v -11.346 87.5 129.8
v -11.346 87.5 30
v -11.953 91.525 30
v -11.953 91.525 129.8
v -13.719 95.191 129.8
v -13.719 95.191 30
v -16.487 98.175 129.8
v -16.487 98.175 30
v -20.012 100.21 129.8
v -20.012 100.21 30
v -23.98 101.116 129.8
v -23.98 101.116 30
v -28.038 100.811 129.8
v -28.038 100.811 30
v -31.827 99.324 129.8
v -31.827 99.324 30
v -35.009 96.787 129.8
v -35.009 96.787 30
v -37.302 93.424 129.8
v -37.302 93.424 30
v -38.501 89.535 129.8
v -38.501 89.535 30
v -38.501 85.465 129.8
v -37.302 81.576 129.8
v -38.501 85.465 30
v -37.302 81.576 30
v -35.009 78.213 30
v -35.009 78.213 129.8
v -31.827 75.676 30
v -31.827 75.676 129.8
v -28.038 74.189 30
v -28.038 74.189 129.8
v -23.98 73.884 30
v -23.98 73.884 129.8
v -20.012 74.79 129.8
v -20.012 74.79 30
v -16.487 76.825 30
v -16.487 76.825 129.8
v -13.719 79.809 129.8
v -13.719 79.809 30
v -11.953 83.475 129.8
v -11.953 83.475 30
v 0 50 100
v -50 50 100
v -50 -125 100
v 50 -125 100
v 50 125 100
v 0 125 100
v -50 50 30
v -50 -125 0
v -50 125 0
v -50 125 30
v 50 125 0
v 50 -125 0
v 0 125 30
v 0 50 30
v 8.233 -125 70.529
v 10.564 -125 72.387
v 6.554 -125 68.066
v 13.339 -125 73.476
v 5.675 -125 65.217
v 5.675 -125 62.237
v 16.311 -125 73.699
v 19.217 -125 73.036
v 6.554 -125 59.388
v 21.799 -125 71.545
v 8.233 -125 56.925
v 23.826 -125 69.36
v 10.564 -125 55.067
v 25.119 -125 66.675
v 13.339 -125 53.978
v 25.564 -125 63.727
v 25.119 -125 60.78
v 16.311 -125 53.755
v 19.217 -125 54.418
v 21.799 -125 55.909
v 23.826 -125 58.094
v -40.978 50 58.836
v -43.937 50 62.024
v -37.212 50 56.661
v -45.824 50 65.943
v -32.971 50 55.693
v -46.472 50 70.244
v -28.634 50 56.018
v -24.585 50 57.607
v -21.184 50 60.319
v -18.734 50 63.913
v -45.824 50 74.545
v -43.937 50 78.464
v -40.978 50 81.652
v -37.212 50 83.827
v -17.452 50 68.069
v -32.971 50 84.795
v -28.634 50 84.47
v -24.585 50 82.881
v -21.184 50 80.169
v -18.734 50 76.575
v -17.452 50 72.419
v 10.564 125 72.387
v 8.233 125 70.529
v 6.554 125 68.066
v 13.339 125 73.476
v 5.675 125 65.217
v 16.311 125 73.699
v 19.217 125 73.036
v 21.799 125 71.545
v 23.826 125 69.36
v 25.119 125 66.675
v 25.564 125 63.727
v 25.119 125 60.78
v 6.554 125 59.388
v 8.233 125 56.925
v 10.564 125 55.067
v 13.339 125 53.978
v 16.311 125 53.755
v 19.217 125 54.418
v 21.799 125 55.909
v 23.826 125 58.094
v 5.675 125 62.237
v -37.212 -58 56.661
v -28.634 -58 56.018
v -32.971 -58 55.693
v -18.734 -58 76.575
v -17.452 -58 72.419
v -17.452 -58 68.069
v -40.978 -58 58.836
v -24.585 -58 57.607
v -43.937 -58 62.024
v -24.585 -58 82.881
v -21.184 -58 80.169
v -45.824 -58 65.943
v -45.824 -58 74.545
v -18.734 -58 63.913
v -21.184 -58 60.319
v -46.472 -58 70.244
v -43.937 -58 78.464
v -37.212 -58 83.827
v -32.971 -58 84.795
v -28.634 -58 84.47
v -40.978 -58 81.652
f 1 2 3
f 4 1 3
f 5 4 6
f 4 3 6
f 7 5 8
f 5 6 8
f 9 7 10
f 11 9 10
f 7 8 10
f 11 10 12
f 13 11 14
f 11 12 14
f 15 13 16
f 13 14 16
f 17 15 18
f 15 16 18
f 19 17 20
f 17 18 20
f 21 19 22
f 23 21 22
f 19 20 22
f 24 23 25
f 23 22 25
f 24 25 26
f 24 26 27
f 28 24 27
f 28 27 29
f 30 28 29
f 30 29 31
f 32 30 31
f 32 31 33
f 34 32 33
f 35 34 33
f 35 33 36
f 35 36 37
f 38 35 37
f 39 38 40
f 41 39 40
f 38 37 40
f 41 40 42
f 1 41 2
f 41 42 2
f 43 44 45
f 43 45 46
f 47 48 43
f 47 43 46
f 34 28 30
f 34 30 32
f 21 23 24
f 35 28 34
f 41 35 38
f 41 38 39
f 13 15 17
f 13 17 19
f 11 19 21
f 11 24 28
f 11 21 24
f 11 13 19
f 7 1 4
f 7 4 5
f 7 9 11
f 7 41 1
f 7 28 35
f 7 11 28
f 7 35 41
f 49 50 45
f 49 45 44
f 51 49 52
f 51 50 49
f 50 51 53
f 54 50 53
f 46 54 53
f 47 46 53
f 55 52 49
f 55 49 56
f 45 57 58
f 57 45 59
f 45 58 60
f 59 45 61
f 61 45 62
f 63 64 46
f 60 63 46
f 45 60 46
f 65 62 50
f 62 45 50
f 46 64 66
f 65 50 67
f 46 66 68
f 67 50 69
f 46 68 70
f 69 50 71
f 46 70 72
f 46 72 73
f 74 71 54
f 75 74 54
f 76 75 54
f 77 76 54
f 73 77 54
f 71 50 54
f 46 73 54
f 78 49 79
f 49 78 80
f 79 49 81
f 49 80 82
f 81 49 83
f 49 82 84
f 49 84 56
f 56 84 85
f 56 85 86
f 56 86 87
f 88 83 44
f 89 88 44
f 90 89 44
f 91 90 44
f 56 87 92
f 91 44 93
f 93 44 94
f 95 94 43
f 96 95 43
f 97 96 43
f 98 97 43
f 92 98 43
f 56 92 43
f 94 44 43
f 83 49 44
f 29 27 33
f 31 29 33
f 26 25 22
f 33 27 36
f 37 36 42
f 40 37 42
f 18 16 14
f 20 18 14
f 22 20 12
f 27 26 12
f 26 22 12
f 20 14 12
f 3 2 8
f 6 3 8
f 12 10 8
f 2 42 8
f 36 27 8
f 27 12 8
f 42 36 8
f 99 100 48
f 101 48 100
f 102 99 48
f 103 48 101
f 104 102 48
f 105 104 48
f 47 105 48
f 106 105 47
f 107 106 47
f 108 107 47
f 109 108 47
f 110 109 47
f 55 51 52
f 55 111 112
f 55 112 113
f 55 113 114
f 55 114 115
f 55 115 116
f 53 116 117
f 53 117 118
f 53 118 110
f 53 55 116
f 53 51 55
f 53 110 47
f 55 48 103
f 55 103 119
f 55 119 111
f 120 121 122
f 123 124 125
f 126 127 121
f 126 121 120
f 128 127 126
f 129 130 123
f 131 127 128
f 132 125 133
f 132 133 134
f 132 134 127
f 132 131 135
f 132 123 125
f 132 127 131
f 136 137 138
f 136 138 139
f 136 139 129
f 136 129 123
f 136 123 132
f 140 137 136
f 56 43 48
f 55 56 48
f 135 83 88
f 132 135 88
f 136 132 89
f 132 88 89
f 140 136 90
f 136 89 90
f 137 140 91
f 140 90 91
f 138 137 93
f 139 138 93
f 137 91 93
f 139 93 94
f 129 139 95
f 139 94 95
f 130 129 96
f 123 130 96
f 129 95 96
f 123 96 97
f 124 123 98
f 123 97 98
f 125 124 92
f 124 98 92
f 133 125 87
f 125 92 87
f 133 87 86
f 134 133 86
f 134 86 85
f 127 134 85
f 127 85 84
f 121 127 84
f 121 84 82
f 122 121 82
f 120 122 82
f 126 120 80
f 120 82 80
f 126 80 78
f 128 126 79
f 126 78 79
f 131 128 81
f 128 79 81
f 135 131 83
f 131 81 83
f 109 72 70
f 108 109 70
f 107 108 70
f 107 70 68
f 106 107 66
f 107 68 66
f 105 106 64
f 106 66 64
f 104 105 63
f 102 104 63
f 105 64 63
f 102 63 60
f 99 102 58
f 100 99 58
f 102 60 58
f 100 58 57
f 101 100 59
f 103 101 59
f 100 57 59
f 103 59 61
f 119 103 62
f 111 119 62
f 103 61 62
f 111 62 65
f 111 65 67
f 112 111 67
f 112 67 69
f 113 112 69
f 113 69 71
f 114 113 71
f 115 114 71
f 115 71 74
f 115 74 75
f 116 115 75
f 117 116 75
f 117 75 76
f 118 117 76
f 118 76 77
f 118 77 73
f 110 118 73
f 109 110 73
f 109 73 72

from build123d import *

# Parameters (mm, degrees)
F0_W     = 100
F0_H     = 250
F1_DEPTH = 100
F2_W     = 100
F2_H     = 150
F3_DEPTH = 70
F4_R     = 14.59155
F5_DEPTH = 108
F7_D     = 20
F8_R     = 13.653747
F9_DEPTH = 99.8


with BuildPart() as f1:
    # F0 (on Top) → F1 (new body)
    with BuildSketch(Plane.XY):
        Rectangle(F0_W, F0_H)
    extrude(amount=F1_DEPTH)

    # F2 (on face) → F3 (cut)
    with BuildSketch(Plane.XY.offset(100)):
        with Locations((-50, 125)):
            Rectangle(F2_W, F2_H)
    extrude(amount=-F3_DEPTH, mode=Mode.SUBTRACT)

    # F4 (on face) → F5 (cut)
    with BuildSketch(Plane(origin=(0, 50, 0), x_dir=(-1, 0, 0), z_dir=(0, 1, 0))):
        with Locations((31.880736, 70.243917)):
            Circle(F4_R)
    extrude(amount=-F5_DEPTH, mode=Mode.SUBTRACT)

    # F7 (through all)
    with Locations(Plane(origin=(0, 125, 0), x_dir=(-1, 0, 0), z_dir=(0, 1, 0))):
        with Locations((-15.563748, 63.727073)):
            Hole(F7_D / 2)


with BuildPart() as f9:
    # F8 (on face) → F9 (new body)
    with BuildSketch(Plane.XY.offset(30)):
        with Locations((-25, 87.5)):
            Circle(F8_R)
    extrude(amount=F9_DEPTH)


solid = Compound([f1.part, f9.part])
